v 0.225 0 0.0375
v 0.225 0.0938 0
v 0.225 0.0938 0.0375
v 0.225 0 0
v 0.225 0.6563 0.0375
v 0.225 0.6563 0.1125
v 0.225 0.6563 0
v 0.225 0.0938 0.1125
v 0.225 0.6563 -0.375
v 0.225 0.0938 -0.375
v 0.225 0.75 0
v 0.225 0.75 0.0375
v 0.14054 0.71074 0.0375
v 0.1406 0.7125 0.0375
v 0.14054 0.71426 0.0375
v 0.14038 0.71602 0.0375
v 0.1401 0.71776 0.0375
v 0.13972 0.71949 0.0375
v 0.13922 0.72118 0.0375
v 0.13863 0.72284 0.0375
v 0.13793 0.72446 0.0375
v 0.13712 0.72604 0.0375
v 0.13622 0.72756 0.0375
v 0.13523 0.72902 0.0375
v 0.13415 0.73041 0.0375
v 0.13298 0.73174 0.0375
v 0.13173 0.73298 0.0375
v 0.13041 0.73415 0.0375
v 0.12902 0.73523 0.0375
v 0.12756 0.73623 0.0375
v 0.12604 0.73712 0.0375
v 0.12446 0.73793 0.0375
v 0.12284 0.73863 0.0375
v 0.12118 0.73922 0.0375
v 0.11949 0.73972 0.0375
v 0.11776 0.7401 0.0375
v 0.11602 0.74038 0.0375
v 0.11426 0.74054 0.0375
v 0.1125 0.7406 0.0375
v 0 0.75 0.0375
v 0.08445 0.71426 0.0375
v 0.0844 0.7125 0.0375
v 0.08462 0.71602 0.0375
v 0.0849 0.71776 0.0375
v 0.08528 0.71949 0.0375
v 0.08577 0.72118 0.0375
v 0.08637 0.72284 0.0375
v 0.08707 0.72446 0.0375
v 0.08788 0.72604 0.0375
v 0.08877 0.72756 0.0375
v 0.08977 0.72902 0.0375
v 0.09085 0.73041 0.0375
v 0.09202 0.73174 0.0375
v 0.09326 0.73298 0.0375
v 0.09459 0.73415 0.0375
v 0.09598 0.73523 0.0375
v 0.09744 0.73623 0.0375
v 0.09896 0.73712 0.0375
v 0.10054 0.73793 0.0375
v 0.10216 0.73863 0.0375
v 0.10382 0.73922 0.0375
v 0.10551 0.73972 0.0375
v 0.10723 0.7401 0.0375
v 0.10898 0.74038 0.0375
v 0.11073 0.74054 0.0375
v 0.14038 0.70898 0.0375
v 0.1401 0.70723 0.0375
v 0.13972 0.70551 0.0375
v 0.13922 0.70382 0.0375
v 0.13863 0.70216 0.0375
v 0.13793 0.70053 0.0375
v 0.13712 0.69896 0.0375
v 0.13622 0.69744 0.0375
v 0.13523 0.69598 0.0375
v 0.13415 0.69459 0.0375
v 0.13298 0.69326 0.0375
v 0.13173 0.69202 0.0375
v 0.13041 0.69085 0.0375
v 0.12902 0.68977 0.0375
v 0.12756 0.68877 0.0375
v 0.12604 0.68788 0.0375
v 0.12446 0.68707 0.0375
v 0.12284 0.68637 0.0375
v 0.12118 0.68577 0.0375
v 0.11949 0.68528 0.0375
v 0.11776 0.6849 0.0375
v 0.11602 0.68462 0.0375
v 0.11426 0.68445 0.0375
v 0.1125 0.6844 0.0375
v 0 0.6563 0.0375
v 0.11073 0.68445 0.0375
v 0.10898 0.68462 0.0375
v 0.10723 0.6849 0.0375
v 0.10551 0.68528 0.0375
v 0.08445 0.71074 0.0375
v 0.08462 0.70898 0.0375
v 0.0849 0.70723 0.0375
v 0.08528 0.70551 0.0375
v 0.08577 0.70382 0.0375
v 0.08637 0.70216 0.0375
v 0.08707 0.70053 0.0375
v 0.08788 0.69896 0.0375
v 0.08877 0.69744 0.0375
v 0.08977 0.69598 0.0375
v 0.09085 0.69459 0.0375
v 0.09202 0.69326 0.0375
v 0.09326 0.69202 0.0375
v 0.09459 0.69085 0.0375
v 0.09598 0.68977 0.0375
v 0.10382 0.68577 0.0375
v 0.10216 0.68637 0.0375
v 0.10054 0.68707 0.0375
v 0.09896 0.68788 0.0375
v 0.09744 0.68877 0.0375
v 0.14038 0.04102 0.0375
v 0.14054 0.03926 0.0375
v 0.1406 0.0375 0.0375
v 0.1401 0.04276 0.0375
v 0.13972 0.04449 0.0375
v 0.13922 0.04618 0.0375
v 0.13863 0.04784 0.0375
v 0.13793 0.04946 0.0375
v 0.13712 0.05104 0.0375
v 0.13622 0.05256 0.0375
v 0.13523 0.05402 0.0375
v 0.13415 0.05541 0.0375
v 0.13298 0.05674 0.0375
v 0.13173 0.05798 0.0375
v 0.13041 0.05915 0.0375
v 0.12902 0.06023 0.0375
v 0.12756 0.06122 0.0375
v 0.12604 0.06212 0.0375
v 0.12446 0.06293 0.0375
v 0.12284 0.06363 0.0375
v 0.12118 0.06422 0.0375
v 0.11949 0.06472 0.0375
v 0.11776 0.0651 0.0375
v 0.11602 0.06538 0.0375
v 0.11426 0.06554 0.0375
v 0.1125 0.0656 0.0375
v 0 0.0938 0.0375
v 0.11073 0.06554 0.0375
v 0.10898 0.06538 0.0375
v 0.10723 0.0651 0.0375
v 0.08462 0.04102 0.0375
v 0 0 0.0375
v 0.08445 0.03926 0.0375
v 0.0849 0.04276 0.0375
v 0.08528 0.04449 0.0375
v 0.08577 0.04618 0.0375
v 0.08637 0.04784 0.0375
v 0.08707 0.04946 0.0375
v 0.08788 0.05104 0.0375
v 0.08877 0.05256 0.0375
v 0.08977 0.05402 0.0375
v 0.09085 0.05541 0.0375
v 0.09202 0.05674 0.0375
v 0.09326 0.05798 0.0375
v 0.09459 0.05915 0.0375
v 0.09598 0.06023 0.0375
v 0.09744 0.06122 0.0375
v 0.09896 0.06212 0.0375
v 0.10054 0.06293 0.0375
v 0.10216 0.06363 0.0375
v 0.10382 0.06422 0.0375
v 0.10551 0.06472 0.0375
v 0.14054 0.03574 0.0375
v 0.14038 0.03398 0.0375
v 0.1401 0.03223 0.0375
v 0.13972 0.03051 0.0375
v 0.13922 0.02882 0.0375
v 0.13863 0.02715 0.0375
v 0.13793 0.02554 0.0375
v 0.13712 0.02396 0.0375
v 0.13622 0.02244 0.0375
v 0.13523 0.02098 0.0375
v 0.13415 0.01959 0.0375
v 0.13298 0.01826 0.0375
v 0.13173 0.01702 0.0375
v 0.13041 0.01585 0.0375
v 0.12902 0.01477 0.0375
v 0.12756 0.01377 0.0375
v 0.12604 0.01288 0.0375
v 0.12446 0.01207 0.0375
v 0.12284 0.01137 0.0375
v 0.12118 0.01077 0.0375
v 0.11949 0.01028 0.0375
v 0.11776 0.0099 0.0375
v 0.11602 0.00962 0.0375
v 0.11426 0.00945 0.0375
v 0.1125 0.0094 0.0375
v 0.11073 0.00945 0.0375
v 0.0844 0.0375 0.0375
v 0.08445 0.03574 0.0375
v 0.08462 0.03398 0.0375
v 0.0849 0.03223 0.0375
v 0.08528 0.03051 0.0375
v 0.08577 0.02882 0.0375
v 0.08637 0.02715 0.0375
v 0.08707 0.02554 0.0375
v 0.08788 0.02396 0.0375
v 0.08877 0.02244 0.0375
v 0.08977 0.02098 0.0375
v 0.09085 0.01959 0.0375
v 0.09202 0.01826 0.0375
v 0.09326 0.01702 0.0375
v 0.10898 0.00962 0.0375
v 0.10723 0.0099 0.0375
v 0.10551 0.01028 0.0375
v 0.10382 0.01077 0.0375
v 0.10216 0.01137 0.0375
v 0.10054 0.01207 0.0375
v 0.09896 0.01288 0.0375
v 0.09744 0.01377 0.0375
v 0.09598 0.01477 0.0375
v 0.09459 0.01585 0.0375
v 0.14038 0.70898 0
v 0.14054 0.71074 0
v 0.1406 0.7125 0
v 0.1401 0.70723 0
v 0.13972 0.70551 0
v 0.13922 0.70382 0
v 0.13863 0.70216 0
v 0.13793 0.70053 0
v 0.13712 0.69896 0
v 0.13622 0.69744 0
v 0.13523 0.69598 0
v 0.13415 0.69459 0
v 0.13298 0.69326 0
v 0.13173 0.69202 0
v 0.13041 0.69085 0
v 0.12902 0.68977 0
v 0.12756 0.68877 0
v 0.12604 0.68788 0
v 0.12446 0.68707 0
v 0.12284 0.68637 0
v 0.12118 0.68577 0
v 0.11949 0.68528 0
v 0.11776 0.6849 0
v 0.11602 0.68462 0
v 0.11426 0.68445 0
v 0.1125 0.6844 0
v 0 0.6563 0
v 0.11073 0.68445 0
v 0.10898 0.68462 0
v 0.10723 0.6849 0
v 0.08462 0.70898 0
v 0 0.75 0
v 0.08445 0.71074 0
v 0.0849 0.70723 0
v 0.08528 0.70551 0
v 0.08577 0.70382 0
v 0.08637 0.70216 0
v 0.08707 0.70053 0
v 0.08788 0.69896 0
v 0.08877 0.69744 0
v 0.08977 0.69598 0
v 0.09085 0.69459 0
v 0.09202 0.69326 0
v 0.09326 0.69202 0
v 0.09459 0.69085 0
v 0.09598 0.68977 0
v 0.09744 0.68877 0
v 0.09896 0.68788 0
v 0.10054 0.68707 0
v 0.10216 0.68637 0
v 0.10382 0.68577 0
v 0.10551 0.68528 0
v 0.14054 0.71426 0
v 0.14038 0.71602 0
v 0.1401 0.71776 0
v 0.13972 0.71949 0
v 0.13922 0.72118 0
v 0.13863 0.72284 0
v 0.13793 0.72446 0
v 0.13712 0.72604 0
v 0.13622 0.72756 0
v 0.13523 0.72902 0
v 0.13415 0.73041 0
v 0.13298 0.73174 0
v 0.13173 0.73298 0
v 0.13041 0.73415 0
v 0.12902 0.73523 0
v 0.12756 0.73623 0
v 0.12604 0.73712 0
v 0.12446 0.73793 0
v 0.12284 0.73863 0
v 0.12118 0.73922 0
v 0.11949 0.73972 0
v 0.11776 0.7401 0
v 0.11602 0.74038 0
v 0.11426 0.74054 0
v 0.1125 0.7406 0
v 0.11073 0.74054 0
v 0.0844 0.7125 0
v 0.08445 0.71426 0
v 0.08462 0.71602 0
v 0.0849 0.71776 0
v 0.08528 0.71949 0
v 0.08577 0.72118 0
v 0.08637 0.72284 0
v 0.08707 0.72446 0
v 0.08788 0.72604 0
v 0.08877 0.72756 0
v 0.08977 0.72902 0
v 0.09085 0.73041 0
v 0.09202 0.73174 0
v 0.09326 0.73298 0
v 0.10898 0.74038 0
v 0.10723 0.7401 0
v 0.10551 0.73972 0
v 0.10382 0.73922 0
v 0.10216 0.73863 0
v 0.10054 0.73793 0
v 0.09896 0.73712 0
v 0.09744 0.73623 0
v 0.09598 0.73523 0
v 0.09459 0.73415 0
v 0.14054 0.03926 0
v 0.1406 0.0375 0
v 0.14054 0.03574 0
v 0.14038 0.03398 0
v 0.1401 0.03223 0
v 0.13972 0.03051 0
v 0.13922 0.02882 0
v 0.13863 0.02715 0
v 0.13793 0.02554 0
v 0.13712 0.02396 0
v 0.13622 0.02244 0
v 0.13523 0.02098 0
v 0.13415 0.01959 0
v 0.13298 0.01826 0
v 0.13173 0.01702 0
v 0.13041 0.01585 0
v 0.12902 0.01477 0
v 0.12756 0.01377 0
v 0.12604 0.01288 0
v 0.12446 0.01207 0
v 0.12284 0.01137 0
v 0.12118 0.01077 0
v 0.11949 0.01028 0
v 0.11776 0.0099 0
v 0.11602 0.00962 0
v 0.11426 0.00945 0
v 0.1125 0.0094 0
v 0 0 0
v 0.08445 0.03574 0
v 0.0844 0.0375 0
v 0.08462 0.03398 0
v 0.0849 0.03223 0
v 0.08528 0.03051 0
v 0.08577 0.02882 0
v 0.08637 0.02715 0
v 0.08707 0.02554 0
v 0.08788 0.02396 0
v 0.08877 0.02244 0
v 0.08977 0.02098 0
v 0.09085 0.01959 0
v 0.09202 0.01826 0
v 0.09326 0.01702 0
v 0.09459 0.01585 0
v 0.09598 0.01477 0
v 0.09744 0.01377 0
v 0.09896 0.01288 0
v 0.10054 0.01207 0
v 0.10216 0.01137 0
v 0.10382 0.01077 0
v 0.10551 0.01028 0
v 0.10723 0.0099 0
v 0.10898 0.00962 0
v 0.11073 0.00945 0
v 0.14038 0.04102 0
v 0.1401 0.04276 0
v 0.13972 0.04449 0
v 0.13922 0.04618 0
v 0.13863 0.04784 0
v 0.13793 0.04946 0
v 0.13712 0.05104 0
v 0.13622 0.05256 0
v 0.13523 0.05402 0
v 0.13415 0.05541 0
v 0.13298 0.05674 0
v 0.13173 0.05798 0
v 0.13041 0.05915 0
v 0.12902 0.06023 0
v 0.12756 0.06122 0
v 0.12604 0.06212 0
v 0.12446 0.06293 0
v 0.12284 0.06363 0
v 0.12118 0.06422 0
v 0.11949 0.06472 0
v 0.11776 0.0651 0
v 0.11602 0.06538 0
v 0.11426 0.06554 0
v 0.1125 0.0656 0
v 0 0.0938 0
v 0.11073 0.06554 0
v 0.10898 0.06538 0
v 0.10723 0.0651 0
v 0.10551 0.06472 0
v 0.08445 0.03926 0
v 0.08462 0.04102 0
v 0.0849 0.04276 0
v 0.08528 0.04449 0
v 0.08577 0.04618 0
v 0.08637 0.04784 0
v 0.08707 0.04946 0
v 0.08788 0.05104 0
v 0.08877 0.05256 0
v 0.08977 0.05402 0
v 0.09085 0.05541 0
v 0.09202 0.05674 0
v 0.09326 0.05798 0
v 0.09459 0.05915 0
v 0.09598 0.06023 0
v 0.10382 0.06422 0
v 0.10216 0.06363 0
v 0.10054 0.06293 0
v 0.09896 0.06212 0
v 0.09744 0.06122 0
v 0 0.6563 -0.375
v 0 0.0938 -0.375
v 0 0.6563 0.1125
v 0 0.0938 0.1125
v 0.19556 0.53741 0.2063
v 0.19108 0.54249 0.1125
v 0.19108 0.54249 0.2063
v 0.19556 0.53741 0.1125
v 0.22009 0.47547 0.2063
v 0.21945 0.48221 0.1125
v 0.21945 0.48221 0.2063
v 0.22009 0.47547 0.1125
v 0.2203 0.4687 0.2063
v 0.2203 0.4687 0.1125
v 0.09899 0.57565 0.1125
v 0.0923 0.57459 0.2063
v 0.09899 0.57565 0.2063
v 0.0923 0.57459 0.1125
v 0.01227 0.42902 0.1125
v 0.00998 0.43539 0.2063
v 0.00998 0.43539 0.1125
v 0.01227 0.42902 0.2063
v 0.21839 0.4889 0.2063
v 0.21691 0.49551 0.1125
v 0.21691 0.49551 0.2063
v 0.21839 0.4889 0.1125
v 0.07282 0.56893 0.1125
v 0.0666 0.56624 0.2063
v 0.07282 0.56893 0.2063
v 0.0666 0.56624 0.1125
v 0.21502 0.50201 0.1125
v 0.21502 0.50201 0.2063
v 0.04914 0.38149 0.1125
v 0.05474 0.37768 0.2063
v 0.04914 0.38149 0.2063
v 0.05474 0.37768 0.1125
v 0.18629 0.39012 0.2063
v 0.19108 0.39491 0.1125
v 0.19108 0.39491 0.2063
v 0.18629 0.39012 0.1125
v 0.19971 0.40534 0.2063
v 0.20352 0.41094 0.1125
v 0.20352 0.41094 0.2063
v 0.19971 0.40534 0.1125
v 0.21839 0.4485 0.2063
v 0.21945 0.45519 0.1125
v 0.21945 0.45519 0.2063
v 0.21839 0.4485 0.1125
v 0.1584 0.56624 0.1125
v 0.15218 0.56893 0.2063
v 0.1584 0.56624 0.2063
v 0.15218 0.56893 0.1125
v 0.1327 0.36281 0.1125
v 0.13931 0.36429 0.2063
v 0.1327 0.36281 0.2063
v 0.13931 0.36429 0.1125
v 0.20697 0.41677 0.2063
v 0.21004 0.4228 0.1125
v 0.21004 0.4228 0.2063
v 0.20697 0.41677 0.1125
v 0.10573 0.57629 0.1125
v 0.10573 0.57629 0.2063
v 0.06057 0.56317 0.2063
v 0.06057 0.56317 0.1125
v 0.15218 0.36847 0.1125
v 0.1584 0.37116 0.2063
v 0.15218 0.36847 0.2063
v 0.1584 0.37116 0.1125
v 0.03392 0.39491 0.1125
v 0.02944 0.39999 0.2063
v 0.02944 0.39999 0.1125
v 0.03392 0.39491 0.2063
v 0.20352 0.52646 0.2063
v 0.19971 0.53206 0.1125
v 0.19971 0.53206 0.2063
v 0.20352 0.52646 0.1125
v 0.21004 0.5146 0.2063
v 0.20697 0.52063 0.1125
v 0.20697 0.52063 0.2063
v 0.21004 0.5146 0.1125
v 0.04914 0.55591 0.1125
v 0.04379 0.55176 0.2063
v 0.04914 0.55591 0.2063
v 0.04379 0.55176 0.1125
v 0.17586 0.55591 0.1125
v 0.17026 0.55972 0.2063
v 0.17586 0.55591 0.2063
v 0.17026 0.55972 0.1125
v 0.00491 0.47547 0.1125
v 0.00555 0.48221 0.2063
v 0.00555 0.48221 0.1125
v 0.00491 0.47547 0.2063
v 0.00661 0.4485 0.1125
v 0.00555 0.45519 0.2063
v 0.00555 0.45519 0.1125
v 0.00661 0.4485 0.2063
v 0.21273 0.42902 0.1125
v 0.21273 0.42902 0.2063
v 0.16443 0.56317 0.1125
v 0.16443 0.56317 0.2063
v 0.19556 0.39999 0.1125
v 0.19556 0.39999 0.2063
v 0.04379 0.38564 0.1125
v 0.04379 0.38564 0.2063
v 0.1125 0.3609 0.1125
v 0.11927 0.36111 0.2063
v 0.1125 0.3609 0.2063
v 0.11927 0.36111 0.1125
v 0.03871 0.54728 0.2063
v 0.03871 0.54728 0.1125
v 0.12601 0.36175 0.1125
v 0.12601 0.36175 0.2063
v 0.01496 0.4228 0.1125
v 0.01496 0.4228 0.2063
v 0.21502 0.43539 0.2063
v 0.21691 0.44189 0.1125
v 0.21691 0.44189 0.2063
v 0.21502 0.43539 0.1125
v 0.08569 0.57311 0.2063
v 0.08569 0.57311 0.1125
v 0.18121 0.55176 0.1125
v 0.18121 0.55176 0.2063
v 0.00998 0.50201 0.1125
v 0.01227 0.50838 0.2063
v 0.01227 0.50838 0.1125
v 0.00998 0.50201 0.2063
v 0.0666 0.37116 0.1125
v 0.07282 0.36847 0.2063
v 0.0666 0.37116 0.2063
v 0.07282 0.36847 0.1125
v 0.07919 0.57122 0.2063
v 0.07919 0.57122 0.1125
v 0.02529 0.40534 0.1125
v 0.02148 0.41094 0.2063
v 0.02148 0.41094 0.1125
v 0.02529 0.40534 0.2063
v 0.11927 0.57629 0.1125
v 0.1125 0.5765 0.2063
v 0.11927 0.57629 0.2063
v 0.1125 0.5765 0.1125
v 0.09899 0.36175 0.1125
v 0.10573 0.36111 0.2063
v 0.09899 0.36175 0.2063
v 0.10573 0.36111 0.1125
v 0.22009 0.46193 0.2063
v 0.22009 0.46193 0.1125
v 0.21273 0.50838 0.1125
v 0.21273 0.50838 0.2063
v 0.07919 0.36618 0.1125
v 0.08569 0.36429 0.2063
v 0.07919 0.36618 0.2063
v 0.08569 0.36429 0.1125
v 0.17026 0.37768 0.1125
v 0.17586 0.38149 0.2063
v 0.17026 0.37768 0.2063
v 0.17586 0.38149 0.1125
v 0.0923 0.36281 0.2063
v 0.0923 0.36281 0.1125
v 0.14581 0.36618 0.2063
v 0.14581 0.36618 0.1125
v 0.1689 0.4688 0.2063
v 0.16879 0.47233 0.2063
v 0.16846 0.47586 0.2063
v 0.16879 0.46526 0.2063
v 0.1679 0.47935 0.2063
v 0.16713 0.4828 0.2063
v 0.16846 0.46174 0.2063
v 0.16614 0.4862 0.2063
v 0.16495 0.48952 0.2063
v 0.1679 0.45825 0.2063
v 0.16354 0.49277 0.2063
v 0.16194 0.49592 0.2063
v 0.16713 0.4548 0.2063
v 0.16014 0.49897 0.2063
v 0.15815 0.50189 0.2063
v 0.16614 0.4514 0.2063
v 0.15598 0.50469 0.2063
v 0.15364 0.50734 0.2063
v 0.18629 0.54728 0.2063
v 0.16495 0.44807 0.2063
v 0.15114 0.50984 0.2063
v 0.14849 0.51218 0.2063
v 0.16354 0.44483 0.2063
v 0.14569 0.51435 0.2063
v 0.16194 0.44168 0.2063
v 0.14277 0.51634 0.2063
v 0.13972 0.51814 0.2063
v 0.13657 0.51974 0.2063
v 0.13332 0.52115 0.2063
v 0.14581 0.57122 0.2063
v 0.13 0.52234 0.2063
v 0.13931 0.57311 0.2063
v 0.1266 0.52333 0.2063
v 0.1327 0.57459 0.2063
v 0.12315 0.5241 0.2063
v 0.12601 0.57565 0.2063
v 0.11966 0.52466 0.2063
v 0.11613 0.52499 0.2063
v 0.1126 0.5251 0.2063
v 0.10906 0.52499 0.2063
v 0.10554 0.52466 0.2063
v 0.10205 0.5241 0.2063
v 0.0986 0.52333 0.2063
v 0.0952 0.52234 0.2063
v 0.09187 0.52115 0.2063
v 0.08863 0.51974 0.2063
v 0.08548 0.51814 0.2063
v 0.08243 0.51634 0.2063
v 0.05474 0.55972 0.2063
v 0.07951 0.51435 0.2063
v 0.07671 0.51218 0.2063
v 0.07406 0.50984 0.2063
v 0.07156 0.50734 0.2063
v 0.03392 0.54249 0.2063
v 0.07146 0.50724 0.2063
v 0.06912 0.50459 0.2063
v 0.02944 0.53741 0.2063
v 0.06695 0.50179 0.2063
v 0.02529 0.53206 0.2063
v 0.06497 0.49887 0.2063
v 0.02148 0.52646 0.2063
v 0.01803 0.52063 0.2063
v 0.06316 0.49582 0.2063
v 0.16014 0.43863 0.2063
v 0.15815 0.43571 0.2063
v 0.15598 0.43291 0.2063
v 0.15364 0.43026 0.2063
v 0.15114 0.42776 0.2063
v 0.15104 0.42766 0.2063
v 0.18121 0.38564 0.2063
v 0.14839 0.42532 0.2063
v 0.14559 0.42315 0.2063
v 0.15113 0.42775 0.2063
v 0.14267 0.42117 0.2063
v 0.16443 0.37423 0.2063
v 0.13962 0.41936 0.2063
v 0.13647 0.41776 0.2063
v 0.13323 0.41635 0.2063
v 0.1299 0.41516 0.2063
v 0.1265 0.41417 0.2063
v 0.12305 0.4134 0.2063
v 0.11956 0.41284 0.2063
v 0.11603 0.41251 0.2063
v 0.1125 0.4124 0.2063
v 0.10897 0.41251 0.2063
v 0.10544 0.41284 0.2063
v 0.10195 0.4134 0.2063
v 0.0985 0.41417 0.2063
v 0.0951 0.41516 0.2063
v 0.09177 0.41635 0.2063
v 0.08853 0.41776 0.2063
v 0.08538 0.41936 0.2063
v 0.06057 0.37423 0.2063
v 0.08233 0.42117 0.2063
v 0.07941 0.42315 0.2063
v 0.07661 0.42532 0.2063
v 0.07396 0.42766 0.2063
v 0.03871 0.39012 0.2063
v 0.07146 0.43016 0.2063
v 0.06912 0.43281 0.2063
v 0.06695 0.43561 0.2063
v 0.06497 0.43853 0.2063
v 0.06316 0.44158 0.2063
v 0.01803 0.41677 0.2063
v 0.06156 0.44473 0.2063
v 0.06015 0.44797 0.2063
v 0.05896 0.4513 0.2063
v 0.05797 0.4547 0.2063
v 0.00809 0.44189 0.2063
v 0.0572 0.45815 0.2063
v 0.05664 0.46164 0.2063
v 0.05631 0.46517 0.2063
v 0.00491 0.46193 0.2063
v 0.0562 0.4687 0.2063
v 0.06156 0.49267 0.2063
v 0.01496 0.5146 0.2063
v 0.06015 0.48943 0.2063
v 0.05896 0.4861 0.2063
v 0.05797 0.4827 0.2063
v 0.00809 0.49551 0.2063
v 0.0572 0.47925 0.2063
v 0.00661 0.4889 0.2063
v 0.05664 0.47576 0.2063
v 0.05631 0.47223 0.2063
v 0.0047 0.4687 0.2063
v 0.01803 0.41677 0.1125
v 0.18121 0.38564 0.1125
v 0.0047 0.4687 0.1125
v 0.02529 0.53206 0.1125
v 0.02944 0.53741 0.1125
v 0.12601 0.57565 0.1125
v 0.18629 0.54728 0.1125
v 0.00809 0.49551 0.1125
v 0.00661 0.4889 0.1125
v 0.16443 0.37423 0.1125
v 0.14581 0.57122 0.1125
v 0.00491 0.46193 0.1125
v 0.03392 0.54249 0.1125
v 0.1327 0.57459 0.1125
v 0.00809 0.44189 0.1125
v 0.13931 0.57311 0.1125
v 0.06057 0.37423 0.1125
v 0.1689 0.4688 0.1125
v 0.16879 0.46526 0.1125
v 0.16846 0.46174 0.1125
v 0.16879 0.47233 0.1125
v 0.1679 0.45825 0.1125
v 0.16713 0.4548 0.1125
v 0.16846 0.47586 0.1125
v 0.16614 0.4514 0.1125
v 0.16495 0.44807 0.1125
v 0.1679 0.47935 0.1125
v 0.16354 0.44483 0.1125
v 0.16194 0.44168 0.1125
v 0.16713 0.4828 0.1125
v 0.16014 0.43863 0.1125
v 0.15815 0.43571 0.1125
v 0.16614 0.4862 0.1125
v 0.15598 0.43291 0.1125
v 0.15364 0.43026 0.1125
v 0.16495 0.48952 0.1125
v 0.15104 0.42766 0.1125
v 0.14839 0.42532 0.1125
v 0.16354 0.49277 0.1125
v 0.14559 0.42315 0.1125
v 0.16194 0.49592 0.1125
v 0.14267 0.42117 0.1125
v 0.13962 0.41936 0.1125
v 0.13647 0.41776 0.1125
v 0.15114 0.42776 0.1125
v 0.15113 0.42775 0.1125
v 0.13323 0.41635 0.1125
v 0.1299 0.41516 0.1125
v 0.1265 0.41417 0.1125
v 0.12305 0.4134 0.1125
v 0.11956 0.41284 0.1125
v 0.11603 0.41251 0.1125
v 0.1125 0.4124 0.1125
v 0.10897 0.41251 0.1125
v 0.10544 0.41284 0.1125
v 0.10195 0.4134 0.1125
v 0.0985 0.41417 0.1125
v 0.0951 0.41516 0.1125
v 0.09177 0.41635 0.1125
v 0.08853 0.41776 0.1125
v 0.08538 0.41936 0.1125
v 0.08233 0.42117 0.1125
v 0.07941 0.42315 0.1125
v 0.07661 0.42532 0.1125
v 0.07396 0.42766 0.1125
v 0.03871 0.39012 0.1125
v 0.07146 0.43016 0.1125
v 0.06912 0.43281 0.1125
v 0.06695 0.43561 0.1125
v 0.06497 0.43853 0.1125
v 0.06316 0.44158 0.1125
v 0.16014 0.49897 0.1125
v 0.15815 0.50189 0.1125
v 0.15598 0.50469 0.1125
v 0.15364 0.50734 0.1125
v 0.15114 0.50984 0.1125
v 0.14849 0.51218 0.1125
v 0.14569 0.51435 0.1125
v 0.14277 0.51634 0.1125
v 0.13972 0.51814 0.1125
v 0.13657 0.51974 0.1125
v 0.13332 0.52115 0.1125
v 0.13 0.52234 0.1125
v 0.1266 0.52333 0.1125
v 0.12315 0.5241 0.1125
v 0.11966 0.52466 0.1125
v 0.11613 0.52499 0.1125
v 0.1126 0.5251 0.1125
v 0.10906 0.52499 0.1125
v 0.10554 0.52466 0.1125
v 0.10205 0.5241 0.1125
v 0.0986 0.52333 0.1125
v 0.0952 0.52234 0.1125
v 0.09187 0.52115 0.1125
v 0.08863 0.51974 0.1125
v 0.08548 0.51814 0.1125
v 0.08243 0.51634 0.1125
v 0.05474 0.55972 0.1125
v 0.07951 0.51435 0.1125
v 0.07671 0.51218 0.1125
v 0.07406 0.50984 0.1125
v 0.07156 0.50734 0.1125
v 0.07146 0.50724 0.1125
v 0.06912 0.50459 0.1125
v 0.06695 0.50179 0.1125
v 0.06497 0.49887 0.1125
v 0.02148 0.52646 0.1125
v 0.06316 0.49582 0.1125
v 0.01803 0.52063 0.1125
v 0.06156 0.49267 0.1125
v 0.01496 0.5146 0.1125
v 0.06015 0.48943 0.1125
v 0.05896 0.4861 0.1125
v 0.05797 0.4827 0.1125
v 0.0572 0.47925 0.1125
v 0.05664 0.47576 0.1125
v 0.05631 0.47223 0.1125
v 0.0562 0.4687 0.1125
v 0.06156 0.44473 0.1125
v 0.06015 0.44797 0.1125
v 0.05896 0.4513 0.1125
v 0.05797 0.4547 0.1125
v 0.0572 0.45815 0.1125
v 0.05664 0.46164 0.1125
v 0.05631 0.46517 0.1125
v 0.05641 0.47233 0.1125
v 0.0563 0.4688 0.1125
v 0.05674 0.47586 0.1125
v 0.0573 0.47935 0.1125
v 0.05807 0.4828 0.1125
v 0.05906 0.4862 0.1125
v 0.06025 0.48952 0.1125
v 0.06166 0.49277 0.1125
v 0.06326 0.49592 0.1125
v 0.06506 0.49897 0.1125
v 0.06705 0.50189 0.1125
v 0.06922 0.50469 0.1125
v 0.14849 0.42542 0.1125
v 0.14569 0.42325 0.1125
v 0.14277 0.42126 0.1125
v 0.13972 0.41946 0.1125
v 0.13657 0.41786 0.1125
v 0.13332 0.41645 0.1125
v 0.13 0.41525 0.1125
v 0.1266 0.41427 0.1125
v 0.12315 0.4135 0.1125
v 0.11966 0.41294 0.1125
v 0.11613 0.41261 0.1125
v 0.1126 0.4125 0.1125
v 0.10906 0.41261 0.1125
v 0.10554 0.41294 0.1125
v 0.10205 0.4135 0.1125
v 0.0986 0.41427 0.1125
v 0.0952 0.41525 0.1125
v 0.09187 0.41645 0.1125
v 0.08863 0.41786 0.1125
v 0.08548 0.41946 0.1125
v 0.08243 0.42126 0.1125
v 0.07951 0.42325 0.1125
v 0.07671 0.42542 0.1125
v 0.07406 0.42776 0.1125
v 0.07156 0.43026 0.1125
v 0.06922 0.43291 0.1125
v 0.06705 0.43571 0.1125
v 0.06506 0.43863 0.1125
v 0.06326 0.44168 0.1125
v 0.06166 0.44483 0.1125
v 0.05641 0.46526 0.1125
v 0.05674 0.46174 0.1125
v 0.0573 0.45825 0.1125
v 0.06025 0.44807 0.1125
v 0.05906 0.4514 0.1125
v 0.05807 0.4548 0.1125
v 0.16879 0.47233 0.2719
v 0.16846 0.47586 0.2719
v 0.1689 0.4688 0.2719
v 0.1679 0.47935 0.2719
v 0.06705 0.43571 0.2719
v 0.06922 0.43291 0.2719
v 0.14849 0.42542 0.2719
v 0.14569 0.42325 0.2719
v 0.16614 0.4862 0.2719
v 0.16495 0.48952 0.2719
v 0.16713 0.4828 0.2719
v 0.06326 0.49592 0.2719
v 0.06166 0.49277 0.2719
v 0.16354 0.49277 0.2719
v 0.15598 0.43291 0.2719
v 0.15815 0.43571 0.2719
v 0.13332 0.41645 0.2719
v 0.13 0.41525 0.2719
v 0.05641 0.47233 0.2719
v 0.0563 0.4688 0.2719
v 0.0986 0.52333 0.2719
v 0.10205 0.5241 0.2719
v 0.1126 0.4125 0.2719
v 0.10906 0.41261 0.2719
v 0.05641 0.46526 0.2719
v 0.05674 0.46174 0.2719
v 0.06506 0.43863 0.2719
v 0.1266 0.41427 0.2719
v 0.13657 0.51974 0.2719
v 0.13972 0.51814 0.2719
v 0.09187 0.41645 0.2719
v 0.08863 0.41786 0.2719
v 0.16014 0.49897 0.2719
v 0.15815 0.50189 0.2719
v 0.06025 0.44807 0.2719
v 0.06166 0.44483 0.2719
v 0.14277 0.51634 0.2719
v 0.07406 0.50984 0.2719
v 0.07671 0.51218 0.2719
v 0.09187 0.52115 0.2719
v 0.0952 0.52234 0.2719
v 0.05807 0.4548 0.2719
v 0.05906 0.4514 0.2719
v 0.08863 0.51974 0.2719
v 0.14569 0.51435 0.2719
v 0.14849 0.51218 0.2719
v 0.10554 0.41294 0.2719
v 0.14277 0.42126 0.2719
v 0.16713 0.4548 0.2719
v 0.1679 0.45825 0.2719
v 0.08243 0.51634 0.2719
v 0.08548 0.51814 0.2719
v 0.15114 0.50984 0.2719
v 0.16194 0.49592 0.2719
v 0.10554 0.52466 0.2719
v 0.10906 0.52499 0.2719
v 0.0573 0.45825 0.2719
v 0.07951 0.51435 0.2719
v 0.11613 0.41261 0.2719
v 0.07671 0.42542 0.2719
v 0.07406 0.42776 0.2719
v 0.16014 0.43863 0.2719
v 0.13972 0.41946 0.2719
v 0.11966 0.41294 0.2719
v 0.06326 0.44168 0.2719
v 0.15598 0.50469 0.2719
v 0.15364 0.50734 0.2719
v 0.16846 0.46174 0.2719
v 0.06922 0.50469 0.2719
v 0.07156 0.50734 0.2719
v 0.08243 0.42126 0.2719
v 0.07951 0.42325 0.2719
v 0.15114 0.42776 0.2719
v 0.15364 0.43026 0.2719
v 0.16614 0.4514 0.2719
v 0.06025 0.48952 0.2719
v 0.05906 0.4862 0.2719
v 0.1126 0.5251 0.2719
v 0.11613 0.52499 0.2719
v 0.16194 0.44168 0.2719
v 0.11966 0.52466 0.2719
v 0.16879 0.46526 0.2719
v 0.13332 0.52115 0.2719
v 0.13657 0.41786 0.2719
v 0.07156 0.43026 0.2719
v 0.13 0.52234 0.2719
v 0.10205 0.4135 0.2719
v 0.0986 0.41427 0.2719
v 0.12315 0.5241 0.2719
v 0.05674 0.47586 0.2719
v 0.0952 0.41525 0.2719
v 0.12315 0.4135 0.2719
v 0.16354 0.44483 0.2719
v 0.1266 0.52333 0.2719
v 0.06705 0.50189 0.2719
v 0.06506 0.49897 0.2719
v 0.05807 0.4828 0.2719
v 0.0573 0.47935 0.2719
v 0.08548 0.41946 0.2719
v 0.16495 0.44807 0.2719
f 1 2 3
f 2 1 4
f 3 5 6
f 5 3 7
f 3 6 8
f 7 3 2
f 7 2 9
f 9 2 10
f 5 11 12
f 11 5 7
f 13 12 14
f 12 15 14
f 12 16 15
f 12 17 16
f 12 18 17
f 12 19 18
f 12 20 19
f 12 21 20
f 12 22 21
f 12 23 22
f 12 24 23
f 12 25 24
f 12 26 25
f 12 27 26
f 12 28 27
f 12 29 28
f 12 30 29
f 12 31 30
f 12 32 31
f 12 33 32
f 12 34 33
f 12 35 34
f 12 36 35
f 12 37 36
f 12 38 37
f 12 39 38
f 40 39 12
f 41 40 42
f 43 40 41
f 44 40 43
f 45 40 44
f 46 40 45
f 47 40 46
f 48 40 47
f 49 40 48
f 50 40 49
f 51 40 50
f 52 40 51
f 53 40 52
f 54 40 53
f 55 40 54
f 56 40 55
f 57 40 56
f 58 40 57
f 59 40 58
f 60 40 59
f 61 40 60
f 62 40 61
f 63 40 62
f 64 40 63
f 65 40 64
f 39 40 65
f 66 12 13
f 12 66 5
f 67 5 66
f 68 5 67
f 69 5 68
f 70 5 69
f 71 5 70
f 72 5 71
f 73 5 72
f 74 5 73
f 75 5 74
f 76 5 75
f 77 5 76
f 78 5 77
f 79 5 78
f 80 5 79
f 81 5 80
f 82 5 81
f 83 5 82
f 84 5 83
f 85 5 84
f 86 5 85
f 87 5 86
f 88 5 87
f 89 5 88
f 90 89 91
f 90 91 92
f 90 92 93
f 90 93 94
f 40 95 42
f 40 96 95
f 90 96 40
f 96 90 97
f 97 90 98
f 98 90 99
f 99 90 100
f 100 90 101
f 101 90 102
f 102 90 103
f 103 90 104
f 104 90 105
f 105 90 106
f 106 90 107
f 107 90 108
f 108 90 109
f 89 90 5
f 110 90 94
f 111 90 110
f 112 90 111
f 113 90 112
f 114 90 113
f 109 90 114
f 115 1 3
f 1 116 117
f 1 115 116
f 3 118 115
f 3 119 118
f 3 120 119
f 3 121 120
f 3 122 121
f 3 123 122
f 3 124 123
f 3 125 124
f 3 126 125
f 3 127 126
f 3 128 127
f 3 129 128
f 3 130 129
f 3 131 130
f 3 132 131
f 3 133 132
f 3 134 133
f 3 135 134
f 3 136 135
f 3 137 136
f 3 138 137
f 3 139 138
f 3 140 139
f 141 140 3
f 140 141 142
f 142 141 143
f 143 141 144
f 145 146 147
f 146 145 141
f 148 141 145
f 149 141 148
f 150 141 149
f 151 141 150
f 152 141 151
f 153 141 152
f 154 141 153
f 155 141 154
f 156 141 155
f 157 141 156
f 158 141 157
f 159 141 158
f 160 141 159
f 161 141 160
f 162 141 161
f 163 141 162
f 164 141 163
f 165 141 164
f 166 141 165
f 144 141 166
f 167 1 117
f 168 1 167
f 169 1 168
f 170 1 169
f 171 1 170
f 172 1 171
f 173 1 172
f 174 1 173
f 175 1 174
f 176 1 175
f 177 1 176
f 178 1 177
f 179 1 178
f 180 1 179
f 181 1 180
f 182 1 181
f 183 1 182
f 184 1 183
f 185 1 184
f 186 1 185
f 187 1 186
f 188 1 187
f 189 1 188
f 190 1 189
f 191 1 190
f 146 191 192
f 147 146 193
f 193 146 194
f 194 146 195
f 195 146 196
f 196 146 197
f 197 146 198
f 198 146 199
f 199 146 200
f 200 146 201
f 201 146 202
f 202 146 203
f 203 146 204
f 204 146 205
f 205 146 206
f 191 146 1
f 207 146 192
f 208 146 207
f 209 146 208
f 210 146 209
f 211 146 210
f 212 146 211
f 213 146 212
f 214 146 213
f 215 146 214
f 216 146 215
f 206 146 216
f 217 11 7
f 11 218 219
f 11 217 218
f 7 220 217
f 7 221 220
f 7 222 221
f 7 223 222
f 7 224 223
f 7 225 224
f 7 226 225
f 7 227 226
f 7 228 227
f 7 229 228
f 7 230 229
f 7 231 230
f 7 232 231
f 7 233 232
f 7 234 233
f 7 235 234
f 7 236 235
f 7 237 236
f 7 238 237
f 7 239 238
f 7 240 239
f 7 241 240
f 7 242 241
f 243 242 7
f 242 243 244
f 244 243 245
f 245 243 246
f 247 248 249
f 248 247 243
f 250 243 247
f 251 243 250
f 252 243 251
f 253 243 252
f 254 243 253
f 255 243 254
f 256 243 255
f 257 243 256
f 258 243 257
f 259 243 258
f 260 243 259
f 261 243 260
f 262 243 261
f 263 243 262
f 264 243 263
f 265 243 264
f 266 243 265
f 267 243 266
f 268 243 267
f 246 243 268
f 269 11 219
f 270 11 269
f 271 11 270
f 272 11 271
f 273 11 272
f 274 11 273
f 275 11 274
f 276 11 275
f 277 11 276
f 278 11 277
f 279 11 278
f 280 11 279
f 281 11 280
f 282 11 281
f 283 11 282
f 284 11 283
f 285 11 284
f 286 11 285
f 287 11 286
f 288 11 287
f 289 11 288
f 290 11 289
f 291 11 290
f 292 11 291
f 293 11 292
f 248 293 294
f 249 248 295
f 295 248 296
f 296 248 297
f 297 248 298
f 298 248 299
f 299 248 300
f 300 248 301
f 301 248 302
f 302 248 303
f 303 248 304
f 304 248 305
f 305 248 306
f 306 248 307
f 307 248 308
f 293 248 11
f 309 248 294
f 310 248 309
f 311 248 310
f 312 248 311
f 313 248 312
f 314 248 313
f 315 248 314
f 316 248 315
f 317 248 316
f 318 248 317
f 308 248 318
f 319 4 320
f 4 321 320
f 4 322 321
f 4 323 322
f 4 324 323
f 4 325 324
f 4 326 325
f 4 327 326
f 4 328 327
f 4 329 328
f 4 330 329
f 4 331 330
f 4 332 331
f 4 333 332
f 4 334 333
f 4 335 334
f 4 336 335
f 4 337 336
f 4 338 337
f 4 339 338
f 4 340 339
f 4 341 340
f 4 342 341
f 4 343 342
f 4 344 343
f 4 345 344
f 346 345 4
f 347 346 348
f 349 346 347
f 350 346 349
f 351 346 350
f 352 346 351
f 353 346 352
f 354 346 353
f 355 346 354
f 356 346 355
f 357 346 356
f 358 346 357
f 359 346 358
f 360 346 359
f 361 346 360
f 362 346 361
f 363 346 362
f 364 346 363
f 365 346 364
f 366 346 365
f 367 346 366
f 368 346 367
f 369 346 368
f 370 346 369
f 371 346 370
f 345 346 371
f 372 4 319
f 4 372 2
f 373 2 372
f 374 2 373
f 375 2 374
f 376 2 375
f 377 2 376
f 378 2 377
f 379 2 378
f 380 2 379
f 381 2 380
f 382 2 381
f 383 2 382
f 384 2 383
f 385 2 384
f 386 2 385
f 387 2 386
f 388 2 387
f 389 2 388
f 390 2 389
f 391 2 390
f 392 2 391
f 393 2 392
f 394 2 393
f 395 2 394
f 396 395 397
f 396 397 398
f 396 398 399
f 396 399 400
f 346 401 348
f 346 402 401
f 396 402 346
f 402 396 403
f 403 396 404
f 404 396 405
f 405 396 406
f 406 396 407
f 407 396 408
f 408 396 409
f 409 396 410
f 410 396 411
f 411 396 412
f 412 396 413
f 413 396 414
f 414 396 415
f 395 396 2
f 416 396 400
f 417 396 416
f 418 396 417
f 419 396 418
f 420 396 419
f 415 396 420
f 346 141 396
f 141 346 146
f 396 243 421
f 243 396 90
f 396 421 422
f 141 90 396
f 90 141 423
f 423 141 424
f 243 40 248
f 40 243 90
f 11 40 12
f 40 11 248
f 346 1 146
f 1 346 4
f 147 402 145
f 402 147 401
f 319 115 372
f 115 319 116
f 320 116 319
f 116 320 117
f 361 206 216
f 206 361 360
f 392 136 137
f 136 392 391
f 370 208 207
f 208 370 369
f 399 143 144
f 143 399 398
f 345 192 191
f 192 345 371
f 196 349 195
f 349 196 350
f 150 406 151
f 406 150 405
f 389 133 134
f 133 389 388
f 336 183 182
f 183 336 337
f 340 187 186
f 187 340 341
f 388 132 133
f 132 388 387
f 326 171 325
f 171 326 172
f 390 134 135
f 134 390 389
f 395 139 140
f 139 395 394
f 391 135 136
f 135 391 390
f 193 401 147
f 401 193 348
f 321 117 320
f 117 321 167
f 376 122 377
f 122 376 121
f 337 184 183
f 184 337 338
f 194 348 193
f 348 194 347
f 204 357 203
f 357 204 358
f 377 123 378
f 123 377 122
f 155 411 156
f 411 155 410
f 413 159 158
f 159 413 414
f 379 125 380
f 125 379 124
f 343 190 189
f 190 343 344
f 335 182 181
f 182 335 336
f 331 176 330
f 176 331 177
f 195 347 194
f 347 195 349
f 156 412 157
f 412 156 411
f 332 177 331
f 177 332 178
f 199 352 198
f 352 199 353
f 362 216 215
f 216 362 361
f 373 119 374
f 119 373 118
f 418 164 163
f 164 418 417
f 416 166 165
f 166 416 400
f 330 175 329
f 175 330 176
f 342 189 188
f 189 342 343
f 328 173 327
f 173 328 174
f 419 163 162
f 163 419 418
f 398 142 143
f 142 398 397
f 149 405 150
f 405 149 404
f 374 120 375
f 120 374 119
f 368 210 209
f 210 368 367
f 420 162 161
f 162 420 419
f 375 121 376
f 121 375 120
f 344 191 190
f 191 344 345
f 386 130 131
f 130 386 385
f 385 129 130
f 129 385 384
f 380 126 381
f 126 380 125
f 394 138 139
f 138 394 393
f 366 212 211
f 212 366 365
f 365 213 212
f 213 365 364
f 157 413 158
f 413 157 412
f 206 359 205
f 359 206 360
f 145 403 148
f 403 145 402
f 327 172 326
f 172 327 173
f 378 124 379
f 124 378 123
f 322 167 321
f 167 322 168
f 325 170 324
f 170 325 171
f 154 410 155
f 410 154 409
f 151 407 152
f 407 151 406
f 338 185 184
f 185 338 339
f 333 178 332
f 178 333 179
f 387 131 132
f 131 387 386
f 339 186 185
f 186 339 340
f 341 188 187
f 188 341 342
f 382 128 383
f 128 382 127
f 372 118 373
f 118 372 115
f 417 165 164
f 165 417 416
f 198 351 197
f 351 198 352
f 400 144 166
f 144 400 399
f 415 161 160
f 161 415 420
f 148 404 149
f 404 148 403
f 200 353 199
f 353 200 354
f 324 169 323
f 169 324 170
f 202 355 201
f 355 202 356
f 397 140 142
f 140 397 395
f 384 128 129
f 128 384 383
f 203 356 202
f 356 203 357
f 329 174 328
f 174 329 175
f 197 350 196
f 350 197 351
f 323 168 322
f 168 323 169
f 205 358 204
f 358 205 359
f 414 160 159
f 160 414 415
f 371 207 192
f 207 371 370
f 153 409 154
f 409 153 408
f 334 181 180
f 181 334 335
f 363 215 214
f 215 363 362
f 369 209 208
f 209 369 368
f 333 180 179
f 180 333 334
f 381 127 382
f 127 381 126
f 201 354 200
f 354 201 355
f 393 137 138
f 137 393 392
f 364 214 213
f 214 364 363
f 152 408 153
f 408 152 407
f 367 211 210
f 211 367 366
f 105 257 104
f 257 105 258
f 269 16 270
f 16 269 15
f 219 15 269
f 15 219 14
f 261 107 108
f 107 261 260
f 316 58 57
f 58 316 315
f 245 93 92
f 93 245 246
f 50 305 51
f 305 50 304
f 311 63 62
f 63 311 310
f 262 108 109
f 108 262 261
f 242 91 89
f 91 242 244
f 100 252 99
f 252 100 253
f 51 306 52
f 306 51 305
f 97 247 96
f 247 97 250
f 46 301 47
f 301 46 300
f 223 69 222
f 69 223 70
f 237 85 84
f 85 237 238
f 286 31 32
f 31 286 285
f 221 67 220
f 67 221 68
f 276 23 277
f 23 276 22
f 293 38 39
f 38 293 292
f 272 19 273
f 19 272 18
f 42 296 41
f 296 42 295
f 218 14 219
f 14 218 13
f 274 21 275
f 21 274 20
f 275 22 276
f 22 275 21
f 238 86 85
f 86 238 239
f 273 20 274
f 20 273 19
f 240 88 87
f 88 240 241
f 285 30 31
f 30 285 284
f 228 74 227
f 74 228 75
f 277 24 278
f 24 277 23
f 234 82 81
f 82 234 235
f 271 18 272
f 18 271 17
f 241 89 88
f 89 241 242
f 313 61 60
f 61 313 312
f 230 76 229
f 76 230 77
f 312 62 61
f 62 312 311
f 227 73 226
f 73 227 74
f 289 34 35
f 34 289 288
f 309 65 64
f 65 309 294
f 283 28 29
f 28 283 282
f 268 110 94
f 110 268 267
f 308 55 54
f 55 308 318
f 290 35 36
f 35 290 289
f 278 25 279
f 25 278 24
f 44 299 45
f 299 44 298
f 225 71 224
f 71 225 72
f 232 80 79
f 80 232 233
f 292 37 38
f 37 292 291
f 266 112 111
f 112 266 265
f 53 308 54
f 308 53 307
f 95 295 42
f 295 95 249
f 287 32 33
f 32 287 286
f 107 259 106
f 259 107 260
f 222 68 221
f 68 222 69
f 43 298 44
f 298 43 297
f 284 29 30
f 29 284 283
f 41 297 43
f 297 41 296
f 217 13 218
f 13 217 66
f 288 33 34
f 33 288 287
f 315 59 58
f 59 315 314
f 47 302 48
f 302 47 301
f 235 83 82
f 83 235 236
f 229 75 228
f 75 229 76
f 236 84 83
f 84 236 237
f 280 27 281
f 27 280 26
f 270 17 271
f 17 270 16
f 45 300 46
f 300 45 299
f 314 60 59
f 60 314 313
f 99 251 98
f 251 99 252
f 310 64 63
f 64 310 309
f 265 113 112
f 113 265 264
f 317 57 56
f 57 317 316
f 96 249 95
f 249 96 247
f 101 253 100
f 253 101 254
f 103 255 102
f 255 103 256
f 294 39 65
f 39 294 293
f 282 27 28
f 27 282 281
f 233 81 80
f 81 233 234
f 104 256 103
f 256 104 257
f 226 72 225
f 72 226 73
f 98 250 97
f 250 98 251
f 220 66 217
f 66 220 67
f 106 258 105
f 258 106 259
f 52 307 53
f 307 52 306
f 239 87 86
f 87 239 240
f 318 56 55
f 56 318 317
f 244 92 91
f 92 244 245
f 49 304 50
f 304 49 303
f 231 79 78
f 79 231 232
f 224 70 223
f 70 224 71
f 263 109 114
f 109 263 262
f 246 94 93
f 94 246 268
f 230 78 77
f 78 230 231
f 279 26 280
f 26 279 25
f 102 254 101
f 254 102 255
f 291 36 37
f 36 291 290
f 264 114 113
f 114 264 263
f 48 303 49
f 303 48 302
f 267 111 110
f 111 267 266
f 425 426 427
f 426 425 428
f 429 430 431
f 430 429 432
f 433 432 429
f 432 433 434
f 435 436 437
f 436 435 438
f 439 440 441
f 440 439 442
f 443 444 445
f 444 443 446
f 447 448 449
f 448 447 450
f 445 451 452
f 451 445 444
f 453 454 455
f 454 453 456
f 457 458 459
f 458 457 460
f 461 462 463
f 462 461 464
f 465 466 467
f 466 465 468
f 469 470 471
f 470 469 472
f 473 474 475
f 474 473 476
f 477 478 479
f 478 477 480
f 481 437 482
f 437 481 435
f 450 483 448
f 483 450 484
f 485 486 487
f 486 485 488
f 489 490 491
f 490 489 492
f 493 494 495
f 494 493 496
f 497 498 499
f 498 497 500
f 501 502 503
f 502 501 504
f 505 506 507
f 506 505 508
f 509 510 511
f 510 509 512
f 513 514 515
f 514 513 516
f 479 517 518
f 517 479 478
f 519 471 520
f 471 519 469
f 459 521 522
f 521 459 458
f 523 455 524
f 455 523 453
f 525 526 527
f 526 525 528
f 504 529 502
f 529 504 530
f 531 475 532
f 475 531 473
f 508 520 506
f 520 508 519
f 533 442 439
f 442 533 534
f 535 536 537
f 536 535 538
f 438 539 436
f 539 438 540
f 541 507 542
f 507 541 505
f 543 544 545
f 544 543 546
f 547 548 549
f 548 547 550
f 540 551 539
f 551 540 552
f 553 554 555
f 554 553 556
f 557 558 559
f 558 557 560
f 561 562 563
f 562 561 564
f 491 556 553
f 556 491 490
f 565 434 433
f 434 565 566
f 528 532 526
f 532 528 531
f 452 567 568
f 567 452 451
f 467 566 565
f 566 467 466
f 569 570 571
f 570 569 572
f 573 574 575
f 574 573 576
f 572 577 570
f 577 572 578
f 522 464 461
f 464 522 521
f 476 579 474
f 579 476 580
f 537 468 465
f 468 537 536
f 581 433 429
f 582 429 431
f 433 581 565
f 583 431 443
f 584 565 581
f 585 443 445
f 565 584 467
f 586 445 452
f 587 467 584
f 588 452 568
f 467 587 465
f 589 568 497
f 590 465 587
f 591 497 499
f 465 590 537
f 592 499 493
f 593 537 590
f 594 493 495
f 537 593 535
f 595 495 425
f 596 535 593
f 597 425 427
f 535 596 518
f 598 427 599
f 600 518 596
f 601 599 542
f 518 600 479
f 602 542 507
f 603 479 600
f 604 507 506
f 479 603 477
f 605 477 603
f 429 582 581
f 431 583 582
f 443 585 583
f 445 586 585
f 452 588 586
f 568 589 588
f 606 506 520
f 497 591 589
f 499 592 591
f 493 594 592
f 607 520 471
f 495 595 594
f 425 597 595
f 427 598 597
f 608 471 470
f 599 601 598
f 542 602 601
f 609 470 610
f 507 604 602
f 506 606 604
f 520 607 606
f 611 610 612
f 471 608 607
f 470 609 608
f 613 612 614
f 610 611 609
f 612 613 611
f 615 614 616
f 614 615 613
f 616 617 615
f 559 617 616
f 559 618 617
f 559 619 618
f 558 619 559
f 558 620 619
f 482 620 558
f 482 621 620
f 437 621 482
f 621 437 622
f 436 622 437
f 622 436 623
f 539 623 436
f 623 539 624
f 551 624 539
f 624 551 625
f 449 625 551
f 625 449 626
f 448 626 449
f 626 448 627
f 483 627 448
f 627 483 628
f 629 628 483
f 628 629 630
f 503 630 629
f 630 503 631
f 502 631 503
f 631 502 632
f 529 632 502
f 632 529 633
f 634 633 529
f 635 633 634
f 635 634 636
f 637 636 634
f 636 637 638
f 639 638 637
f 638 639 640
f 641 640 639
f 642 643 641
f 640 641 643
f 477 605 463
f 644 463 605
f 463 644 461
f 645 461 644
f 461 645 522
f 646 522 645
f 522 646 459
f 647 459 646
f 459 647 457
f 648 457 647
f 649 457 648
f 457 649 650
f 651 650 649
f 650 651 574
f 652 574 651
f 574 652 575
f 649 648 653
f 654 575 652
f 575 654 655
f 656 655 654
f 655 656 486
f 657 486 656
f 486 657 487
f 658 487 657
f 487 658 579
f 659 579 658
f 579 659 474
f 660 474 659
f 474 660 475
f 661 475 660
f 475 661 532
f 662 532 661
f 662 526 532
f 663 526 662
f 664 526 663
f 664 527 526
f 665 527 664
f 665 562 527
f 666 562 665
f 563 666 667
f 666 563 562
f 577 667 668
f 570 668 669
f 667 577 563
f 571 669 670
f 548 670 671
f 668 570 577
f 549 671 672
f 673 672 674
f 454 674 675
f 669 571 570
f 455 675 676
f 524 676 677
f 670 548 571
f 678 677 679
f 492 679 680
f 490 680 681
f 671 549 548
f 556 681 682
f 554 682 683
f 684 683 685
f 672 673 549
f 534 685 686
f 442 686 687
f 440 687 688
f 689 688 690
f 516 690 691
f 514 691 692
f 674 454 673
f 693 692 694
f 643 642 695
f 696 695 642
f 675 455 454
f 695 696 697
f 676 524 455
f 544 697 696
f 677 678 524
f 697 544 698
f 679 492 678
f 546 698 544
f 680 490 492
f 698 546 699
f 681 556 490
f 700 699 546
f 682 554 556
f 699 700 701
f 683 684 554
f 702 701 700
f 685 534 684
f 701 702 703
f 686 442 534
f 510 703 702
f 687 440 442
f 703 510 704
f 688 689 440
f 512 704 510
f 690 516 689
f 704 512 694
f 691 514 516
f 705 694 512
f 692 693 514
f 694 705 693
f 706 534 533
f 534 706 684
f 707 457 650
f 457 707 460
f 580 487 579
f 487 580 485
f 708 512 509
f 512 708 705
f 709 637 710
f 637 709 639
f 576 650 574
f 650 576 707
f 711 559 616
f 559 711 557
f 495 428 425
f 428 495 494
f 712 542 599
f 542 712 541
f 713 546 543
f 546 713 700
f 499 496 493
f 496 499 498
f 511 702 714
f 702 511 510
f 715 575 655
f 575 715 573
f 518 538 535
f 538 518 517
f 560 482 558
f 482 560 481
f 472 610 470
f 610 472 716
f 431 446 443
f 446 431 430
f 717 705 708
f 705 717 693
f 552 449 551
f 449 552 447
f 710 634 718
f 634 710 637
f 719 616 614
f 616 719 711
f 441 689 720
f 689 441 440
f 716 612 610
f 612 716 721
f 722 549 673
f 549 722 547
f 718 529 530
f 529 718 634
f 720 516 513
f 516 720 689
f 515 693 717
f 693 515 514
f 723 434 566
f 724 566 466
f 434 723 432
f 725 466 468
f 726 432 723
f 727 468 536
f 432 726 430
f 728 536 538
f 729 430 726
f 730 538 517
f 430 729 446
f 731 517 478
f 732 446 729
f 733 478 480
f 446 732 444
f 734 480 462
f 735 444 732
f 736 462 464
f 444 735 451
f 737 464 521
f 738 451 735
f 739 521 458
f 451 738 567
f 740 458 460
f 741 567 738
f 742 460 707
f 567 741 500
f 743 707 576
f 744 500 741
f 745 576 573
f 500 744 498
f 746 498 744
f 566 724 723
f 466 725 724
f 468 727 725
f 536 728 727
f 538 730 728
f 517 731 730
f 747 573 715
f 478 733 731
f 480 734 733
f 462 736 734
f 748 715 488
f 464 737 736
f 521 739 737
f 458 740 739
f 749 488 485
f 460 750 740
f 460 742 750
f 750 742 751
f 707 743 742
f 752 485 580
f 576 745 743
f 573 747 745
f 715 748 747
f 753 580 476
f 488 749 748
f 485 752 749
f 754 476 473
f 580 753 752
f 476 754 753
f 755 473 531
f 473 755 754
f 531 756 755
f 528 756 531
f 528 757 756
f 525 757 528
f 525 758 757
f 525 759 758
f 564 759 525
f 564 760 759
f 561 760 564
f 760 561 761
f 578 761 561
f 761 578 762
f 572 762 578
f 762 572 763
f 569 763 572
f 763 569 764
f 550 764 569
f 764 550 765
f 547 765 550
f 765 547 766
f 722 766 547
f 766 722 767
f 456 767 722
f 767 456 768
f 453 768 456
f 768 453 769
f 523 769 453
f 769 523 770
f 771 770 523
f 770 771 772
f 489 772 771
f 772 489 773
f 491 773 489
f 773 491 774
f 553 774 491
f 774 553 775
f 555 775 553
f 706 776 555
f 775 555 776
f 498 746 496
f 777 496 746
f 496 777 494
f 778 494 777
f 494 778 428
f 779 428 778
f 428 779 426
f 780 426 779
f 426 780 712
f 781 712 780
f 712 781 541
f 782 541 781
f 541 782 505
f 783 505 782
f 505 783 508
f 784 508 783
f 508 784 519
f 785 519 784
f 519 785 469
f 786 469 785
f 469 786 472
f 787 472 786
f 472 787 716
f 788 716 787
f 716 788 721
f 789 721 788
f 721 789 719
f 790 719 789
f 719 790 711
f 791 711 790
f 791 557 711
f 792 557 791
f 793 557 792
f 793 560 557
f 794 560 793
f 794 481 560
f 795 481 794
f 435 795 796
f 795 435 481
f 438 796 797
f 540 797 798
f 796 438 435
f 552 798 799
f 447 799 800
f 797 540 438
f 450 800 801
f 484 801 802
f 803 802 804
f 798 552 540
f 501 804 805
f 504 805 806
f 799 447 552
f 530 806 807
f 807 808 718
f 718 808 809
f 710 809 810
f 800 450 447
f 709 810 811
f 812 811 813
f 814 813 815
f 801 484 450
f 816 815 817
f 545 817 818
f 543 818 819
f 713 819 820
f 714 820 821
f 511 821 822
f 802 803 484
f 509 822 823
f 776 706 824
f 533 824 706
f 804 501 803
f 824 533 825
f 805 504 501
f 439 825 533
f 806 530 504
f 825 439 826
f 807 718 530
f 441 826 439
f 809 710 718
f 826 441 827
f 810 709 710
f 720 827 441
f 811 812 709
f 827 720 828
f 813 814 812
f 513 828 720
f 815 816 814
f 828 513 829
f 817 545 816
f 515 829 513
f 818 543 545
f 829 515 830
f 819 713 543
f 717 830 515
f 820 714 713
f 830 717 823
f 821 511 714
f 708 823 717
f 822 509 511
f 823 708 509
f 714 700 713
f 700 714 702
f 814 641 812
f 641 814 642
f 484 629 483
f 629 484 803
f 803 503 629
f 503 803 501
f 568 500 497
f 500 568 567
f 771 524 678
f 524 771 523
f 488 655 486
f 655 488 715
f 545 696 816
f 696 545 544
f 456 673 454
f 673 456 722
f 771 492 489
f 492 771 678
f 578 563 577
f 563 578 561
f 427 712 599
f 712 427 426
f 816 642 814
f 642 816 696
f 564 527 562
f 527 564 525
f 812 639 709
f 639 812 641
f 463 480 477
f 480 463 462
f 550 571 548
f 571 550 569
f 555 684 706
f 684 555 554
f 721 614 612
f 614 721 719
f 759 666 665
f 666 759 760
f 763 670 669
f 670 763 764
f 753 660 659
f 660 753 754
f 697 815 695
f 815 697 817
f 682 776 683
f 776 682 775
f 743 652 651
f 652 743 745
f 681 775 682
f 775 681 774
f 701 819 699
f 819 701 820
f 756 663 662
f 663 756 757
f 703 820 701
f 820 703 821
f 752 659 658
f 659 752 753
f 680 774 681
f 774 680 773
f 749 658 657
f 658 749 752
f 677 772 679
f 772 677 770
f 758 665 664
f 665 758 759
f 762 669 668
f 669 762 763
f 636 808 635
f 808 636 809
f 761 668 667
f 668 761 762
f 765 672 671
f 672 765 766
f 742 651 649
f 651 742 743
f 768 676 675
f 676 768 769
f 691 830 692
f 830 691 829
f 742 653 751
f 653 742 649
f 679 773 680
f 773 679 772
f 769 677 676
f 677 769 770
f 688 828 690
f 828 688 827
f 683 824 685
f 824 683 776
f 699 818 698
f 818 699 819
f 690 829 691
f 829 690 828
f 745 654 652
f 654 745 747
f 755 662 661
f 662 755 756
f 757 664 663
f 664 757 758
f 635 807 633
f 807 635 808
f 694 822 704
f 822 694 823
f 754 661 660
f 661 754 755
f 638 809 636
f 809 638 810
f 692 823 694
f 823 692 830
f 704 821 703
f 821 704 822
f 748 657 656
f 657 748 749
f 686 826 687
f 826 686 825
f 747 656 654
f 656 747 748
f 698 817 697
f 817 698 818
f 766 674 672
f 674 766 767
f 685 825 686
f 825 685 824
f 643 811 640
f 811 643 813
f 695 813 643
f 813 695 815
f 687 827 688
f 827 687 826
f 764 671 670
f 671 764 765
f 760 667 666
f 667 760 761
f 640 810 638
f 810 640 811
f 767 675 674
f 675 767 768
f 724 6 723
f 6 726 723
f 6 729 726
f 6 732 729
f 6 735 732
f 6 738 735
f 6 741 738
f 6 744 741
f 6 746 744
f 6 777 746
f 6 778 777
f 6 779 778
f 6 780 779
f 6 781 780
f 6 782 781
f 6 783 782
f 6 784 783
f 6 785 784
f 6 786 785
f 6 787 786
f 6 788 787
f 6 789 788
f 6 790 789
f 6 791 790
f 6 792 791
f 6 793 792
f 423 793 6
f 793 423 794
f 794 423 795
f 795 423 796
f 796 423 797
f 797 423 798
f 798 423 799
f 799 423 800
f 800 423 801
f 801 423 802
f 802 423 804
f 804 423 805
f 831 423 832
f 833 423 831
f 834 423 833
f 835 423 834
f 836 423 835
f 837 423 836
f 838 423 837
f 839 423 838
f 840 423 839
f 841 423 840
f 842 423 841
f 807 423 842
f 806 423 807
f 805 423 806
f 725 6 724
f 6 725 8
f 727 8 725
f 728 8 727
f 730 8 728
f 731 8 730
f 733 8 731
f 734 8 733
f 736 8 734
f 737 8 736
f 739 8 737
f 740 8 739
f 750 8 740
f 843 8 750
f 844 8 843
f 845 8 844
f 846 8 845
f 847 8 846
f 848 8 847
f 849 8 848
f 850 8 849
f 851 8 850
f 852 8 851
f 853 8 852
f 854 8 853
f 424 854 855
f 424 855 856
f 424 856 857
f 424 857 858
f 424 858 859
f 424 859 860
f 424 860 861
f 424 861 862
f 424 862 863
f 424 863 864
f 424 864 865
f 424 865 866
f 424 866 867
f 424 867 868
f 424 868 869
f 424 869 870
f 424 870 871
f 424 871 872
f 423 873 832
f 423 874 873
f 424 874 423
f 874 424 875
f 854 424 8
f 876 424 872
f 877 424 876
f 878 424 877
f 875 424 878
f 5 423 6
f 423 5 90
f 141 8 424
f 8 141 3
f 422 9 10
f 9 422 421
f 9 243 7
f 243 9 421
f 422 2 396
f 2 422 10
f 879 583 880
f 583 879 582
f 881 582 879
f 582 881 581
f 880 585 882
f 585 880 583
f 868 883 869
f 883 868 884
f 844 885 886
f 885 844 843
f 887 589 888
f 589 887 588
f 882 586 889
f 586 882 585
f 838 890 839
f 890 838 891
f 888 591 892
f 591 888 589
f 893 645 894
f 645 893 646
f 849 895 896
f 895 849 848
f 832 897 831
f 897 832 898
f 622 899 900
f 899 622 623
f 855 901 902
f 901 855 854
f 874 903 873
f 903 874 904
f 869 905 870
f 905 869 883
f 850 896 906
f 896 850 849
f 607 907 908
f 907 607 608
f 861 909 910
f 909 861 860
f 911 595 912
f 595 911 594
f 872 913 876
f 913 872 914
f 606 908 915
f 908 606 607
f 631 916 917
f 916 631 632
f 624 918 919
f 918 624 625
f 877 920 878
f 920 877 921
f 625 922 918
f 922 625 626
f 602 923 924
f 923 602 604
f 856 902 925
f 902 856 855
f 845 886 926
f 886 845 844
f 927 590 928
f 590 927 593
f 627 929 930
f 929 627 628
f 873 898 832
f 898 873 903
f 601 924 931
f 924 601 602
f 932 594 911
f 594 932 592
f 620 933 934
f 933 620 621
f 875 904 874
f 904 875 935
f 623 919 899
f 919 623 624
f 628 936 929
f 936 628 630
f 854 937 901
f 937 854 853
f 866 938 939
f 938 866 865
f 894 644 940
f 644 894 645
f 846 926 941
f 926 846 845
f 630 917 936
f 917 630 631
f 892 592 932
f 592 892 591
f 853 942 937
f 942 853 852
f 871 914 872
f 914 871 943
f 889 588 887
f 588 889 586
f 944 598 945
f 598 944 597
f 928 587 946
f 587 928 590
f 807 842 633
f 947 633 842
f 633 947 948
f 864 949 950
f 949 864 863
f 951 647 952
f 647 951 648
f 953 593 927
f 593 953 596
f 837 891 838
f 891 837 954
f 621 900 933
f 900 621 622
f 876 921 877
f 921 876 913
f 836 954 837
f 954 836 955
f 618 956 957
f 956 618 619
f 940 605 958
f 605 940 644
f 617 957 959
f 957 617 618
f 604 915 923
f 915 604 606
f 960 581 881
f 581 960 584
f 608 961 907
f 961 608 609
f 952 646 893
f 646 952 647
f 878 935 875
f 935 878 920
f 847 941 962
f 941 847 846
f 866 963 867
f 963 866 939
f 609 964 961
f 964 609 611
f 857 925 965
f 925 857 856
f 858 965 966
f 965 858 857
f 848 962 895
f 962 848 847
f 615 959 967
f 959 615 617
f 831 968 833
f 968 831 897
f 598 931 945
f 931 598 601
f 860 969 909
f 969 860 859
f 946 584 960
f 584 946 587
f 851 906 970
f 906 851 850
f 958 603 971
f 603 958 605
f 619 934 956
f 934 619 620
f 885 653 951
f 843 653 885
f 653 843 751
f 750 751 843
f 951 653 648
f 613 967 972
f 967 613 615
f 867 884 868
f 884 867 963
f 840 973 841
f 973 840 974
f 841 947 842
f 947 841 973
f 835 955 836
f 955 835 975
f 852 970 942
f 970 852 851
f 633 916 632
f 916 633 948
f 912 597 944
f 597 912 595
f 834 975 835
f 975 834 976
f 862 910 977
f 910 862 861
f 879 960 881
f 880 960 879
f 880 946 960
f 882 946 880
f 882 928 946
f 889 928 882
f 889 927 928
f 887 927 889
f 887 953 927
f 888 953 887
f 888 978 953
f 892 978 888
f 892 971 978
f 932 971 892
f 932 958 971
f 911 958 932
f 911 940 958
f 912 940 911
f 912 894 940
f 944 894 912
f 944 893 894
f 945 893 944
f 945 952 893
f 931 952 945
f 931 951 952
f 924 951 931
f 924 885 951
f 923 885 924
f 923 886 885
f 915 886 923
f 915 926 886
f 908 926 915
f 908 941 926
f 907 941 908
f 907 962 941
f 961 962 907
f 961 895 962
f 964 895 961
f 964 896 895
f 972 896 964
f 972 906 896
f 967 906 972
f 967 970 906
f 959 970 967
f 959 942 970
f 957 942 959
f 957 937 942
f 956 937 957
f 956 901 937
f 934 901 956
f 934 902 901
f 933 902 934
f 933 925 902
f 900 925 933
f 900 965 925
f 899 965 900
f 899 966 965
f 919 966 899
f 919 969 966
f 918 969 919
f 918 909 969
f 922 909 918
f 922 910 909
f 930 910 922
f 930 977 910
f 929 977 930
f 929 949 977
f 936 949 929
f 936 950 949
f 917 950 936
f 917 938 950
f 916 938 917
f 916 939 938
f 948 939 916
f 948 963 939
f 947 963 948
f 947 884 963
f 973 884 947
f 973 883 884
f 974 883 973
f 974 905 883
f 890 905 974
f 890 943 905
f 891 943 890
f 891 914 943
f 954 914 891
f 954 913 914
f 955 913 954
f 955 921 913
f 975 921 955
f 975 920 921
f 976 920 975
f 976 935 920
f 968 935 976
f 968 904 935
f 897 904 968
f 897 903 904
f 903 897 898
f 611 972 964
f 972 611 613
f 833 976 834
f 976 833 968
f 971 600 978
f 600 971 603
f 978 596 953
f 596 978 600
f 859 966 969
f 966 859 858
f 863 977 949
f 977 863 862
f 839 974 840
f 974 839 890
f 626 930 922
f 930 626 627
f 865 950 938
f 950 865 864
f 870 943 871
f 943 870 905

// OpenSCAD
// Parametric dimensions
plate_length = 0.225;
plate_width = 0.75;
plate_thickness = 0.0375;

hole_radius = 0.0281;
hole1_x = 0.1125;
hole1_y = 0.0375;
hole2_x = 0.1125;
hole2_y = 0.7125;

upper_rect_length = 0.225;
upper_rect_width = 0.5625;
upper_rect_y_offset = 0.0938;
upper_rect_top_z = 0.1125;

lower_rect_length = 0.225;
lower_rect_width = 0.5625;
lower_rect_y_offset = 0.0938;
lower_rect_depth = 0.375;

annular_outer_r = 0.1078;
annular_inner_r = 0.0563;
annular_cx = 0.1125;
annular_cy = 0.4687;
annular_bottom_z = 0.1125;
annular_top_z = 0.2063;

pin_radius = 0.0563;
pin_cx = 0.1126;
pin_cy = 0.4688;
pin_bottom_z = 0.1125;
pin_top_z = 0.2719;

$fn = 100;

union() {
    // Base plate with two through holes
    difference() {
        cube([plate_length, plate_width, plate_thickness]);
        translate([hole1_x, hole1_y, -0.001])
            cylinder(h=plate_thickness + 0.002, r=hole_radius);
        translate([hole2_x, hole2_y, -0.001])
            cylinder(h=plate_thickness + 0.002, r=hole_radius);
    }

    // Upper central rectangular solid (shoulder)
    translate([0, upper_rect_y_offset, plate_thickness])
        cube([upper_rect_length, upper_rect_width, upper_rect_top_z - plate_thickness]);

    // Lower central rectangular solid (underside)
    translate([0, lower_rect_y_offset, -lower_rect_depth])
        cube([lower_rect_length, lower_rect_width, lower_rect_depth]);

    // Annular boss (hollow ring section)
    translate([annular_cx, annular_cy, annular_bottom_z])
        difference() {
            cylinder(h=annular_top_z - annular_bottom_z, r=annular_outer_r);
            translate([0, 0, -0.001])
                cylinder(h=annular_top_z - annular_bottom_z + 0.002, r=annular_inner_r);
        }

    // Solid circular pin above the shoulder
    translate([pin_cx, pin_cy, pin_bottom_z])
        cylinder(h=pin_top_z - pin_bottom_z, r=pin_radius);
}
